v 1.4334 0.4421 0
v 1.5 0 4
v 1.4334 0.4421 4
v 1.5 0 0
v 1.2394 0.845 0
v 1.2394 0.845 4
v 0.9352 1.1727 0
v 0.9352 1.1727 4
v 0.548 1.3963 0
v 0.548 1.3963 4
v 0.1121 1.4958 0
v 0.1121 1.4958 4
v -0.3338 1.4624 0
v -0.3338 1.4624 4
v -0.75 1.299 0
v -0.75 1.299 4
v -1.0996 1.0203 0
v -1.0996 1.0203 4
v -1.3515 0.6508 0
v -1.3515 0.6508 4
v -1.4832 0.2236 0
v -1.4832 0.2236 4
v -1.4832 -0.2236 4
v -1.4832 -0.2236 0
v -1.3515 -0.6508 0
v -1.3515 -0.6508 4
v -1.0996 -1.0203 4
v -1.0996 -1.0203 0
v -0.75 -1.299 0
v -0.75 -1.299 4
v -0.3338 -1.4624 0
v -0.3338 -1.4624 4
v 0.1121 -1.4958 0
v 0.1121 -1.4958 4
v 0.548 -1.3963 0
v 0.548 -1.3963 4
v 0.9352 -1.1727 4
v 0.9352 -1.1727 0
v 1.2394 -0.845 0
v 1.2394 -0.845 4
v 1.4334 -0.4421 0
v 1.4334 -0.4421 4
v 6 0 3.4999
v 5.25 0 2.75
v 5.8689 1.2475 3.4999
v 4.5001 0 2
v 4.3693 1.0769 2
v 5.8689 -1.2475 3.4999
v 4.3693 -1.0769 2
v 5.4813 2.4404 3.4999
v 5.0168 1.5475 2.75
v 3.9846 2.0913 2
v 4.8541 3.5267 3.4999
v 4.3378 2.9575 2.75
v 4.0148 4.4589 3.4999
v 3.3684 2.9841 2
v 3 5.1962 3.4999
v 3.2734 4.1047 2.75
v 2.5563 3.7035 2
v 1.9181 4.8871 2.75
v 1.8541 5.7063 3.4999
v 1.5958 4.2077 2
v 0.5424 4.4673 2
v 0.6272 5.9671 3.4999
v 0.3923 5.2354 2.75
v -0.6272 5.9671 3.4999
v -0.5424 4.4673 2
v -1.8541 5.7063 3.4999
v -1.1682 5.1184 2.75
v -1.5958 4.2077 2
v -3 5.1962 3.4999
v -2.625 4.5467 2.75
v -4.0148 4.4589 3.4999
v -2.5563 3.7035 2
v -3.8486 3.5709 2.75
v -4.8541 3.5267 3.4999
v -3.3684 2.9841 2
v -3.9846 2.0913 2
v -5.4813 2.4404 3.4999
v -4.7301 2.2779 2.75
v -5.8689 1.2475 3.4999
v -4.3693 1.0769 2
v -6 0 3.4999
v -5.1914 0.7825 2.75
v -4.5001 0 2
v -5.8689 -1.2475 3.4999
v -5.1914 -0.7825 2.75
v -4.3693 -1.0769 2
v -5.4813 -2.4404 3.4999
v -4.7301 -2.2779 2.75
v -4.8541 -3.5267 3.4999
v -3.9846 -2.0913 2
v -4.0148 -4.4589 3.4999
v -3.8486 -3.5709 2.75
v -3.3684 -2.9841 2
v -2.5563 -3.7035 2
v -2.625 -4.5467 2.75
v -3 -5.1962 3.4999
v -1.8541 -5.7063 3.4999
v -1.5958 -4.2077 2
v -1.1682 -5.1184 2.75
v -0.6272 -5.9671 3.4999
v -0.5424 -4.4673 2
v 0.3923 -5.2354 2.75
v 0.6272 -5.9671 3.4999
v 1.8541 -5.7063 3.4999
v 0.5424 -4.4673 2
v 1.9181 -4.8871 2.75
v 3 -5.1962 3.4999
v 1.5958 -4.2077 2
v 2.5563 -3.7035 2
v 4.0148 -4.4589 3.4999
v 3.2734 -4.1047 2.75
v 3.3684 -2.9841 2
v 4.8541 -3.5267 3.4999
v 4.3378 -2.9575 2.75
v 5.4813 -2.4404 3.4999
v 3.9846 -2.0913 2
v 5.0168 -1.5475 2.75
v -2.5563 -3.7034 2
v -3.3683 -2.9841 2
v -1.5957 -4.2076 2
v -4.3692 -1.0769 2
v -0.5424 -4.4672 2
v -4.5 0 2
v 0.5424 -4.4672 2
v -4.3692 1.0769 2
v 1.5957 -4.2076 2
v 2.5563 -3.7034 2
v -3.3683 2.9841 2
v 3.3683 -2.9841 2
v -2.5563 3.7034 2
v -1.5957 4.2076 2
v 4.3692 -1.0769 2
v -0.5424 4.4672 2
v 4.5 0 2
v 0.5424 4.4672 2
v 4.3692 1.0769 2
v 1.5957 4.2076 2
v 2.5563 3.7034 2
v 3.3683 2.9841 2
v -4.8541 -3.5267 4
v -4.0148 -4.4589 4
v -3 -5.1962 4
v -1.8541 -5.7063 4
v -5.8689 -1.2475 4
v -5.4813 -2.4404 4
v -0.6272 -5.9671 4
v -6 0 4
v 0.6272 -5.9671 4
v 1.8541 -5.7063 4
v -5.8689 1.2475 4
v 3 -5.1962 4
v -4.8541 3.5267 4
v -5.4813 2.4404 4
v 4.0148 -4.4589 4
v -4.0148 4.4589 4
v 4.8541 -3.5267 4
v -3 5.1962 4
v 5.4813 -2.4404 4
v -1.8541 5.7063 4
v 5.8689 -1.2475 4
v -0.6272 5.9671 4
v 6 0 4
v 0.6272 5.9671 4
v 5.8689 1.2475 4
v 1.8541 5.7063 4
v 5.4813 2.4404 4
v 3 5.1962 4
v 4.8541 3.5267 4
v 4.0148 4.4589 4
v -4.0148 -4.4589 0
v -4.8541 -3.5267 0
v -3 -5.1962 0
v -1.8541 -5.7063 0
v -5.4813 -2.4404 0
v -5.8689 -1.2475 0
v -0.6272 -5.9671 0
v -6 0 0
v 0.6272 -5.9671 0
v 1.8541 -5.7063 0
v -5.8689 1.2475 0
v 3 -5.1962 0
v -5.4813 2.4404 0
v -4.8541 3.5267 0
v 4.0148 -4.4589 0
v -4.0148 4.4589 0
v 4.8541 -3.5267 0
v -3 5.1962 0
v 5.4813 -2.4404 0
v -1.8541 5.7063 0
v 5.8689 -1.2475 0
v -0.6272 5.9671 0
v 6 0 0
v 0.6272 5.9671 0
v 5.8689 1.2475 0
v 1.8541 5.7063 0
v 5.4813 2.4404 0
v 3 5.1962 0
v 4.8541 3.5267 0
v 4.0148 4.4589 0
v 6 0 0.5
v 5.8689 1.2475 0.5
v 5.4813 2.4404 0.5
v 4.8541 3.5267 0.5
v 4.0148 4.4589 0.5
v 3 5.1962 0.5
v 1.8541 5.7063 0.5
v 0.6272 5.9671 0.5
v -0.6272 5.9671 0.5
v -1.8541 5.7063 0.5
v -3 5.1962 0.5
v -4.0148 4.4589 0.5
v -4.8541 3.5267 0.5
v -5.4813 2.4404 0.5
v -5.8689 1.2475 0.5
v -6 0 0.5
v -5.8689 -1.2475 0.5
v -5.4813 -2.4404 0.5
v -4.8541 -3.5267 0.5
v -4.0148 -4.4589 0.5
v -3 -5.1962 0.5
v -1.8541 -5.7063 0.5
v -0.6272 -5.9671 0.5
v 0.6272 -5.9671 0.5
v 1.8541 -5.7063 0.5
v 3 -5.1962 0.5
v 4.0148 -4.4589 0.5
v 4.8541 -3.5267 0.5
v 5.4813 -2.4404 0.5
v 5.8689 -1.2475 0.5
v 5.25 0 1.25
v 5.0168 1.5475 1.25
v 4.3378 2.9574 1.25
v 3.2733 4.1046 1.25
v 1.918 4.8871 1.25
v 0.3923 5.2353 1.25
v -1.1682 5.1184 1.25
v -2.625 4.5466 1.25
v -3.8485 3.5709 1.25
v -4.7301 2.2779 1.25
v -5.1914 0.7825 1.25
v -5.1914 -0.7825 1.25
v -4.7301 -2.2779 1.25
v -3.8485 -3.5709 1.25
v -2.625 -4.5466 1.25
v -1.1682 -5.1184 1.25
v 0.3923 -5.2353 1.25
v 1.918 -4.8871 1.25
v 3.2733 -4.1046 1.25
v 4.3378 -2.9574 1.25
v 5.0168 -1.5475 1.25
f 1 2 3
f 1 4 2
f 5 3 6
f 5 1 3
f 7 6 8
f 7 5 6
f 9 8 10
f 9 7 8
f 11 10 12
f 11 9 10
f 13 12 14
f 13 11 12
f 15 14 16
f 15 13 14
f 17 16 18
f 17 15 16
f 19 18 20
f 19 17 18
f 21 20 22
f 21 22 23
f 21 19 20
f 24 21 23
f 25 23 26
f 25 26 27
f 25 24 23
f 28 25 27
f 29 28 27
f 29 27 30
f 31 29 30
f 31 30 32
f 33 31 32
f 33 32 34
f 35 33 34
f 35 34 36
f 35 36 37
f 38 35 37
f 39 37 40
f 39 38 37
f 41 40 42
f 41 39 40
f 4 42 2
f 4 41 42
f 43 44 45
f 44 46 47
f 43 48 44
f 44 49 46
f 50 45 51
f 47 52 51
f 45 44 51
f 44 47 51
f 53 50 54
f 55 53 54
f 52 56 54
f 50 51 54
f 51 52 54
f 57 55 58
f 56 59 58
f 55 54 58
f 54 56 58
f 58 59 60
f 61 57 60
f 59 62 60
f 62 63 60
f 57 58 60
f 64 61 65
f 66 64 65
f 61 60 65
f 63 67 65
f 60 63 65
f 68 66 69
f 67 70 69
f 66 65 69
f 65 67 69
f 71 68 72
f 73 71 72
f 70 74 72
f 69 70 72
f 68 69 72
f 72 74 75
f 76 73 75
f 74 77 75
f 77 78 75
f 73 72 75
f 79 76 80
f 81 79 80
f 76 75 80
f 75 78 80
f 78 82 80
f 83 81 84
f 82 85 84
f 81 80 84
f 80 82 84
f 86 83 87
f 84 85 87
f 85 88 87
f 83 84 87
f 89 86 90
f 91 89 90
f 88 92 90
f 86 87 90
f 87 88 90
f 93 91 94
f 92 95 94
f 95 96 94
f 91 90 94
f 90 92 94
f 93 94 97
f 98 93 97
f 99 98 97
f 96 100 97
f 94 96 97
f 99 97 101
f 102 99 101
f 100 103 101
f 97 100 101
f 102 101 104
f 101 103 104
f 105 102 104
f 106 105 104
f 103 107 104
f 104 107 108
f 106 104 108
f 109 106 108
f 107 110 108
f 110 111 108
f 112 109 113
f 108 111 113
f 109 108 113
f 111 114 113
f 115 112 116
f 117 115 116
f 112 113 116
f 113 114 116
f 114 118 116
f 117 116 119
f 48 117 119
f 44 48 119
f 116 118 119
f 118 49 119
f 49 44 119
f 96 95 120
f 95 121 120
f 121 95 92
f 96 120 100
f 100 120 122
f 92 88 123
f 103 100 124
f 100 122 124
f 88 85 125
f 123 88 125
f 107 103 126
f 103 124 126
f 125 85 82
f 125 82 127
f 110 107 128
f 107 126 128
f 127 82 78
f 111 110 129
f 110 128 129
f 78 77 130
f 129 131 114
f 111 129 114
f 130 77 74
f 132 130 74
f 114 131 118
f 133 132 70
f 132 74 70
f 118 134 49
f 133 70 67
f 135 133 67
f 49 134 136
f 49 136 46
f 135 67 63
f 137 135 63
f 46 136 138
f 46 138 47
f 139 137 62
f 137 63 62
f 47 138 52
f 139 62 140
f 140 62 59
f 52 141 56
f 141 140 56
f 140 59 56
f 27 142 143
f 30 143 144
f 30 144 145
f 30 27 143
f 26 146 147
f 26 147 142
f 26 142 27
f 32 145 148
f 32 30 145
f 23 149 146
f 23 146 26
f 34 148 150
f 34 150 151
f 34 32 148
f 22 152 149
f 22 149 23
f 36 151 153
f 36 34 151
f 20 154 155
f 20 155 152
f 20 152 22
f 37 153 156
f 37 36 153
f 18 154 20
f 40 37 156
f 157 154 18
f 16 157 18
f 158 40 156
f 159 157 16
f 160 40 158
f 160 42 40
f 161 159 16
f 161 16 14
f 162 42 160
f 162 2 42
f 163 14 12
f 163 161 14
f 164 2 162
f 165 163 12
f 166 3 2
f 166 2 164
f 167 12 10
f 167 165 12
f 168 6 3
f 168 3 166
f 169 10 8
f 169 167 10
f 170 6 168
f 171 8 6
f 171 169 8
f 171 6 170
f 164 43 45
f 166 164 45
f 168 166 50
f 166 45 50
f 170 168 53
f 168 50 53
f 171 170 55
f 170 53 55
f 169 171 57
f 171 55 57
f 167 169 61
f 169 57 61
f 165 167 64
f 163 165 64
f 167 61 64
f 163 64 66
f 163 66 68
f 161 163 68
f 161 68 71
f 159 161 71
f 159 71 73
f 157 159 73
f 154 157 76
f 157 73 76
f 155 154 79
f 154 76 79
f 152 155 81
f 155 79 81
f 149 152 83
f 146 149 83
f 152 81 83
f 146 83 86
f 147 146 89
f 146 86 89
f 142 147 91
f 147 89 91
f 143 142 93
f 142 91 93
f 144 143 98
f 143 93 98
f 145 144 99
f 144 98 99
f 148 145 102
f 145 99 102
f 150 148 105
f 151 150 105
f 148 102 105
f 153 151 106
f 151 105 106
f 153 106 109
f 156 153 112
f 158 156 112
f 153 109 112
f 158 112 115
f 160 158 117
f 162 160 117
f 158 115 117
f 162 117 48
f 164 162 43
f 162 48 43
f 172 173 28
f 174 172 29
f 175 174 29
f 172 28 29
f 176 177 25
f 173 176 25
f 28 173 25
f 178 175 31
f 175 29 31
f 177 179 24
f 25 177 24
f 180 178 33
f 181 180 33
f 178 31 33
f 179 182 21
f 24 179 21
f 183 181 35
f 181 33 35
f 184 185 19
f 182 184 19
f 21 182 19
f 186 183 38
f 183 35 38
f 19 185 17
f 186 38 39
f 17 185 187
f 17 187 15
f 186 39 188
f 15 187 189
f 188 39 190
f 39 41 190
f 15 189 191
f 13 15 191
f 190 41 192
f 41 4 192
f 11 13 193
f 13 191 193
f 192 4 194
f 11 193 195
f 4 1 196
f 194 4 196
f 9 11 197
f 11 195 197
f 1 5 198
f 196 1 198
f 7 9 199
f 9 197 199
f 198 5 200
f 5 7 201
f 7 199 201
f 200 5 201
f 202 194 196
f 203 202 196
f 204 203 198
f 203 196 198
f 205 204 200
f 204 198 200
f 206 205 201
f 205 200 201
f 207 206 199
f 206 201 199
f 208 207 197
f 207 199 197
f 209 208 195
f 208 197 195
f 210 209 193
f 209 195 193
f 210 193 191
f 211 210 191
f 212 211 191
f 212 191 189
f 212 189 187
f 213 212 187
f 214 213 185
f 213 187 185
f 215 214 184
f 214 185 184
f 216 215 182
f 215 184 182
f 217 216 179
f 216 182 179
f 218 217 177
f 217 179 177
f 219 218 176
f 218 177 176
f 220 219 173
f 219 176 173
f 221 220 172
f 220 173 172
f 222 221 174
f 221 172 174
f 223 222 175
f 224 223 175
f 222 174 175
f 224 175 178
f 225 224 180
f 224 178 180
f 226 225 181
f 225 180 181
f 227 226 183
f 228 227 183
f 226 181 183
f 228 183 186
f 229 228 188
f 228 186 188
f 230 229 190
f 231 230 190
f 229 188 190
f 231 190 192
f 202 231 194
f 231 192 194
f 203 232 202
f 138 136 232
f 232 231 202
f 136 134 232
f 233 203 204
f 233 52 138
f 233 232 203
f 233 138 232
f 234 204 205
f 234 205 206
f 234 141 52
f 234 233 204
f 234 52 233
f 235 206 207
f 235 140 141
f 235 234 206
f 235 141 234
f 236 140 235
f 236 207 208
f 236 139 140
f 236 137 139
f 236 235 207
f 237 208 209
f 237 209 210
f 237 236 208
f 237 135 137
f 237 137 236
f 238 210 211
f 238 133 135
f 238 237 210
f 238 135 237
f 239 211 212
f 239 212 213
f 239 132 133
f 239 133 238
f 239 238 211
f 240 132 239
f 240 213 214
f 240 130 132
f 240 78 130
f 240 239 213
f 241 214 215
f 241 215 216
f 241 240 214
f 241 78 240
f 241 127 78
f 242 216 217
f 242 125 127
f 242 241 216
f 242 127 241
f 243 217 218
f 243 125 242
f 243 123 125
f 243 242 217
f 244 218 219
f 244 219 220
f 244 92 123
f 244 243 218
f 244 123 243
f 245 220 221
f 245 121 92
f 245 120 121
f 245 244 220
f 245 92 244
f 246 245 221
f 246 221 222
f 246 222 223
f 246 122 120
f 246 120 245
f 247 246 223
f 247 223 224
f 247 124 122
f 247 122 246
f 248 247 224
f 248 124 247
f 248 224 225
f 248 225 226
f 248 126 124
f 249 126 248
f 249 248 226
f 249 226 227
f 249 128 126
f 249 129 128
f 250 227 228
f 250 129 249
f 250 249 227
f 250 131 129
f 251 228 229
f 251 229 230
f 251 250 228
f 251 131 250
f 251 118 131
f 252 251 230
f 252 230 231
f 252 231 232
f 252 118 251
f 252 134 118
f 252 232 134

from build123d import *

# Parameters (mm, degrees)
SKETCH1_R           = 6
SKETCH1_R_2         = 1.5
BOSS_EXTRUDE1_DEPTH = 2
CHAMFER1_SIZE       = 1.5
SKETCH2_R           = 6
SKETCH2_R_2         = 1.5
BOSS_EXTRUDE2_DEPTH = 2
CHAMFER2_SIZE       = 1.5


with BuildPart() as part:
    # Sketch1 → Boss-Extrude1 (new body)
    with BuildSketch(Plane.XY):
        Circle(SKETCH1_R)
        Circle(SKETCH1_R_2, mode=Mode.SUBTRACT)
    extrude(amount=BOSS_EXTRUDE1_DEPTH)

    # Chamfer1
    chamfer1_edges = [part.edges().sort_by_distance(p)[0] for p in [
        (-6, 0, 2),
    ]]
    chamfer(chamfer1_edges, length=CHAMFER1_SIZE)

    # Sketch2 → Boss-Extrude2 (add)
    with BuildSketch(Plane.XY.offset(2)):
        Circle(SKETCH2_R)
        Circle(SKETCH2_R_2, mode=Mode.SUBTRACT)
    extrude(amount=BOSS_EXTRUDE2_DEPTH)

    # Chamfer2
    chamfer2_edges = [part.edges().sort_by_distance(p)[0] for p in [
        (-6, 0, 2),
    ]]
    chamfer(chamfer2_edges, length=CHAMFER2_SIZE - 0.0001)  # a hair under: the kernel refuses the full size


solid = part.part
